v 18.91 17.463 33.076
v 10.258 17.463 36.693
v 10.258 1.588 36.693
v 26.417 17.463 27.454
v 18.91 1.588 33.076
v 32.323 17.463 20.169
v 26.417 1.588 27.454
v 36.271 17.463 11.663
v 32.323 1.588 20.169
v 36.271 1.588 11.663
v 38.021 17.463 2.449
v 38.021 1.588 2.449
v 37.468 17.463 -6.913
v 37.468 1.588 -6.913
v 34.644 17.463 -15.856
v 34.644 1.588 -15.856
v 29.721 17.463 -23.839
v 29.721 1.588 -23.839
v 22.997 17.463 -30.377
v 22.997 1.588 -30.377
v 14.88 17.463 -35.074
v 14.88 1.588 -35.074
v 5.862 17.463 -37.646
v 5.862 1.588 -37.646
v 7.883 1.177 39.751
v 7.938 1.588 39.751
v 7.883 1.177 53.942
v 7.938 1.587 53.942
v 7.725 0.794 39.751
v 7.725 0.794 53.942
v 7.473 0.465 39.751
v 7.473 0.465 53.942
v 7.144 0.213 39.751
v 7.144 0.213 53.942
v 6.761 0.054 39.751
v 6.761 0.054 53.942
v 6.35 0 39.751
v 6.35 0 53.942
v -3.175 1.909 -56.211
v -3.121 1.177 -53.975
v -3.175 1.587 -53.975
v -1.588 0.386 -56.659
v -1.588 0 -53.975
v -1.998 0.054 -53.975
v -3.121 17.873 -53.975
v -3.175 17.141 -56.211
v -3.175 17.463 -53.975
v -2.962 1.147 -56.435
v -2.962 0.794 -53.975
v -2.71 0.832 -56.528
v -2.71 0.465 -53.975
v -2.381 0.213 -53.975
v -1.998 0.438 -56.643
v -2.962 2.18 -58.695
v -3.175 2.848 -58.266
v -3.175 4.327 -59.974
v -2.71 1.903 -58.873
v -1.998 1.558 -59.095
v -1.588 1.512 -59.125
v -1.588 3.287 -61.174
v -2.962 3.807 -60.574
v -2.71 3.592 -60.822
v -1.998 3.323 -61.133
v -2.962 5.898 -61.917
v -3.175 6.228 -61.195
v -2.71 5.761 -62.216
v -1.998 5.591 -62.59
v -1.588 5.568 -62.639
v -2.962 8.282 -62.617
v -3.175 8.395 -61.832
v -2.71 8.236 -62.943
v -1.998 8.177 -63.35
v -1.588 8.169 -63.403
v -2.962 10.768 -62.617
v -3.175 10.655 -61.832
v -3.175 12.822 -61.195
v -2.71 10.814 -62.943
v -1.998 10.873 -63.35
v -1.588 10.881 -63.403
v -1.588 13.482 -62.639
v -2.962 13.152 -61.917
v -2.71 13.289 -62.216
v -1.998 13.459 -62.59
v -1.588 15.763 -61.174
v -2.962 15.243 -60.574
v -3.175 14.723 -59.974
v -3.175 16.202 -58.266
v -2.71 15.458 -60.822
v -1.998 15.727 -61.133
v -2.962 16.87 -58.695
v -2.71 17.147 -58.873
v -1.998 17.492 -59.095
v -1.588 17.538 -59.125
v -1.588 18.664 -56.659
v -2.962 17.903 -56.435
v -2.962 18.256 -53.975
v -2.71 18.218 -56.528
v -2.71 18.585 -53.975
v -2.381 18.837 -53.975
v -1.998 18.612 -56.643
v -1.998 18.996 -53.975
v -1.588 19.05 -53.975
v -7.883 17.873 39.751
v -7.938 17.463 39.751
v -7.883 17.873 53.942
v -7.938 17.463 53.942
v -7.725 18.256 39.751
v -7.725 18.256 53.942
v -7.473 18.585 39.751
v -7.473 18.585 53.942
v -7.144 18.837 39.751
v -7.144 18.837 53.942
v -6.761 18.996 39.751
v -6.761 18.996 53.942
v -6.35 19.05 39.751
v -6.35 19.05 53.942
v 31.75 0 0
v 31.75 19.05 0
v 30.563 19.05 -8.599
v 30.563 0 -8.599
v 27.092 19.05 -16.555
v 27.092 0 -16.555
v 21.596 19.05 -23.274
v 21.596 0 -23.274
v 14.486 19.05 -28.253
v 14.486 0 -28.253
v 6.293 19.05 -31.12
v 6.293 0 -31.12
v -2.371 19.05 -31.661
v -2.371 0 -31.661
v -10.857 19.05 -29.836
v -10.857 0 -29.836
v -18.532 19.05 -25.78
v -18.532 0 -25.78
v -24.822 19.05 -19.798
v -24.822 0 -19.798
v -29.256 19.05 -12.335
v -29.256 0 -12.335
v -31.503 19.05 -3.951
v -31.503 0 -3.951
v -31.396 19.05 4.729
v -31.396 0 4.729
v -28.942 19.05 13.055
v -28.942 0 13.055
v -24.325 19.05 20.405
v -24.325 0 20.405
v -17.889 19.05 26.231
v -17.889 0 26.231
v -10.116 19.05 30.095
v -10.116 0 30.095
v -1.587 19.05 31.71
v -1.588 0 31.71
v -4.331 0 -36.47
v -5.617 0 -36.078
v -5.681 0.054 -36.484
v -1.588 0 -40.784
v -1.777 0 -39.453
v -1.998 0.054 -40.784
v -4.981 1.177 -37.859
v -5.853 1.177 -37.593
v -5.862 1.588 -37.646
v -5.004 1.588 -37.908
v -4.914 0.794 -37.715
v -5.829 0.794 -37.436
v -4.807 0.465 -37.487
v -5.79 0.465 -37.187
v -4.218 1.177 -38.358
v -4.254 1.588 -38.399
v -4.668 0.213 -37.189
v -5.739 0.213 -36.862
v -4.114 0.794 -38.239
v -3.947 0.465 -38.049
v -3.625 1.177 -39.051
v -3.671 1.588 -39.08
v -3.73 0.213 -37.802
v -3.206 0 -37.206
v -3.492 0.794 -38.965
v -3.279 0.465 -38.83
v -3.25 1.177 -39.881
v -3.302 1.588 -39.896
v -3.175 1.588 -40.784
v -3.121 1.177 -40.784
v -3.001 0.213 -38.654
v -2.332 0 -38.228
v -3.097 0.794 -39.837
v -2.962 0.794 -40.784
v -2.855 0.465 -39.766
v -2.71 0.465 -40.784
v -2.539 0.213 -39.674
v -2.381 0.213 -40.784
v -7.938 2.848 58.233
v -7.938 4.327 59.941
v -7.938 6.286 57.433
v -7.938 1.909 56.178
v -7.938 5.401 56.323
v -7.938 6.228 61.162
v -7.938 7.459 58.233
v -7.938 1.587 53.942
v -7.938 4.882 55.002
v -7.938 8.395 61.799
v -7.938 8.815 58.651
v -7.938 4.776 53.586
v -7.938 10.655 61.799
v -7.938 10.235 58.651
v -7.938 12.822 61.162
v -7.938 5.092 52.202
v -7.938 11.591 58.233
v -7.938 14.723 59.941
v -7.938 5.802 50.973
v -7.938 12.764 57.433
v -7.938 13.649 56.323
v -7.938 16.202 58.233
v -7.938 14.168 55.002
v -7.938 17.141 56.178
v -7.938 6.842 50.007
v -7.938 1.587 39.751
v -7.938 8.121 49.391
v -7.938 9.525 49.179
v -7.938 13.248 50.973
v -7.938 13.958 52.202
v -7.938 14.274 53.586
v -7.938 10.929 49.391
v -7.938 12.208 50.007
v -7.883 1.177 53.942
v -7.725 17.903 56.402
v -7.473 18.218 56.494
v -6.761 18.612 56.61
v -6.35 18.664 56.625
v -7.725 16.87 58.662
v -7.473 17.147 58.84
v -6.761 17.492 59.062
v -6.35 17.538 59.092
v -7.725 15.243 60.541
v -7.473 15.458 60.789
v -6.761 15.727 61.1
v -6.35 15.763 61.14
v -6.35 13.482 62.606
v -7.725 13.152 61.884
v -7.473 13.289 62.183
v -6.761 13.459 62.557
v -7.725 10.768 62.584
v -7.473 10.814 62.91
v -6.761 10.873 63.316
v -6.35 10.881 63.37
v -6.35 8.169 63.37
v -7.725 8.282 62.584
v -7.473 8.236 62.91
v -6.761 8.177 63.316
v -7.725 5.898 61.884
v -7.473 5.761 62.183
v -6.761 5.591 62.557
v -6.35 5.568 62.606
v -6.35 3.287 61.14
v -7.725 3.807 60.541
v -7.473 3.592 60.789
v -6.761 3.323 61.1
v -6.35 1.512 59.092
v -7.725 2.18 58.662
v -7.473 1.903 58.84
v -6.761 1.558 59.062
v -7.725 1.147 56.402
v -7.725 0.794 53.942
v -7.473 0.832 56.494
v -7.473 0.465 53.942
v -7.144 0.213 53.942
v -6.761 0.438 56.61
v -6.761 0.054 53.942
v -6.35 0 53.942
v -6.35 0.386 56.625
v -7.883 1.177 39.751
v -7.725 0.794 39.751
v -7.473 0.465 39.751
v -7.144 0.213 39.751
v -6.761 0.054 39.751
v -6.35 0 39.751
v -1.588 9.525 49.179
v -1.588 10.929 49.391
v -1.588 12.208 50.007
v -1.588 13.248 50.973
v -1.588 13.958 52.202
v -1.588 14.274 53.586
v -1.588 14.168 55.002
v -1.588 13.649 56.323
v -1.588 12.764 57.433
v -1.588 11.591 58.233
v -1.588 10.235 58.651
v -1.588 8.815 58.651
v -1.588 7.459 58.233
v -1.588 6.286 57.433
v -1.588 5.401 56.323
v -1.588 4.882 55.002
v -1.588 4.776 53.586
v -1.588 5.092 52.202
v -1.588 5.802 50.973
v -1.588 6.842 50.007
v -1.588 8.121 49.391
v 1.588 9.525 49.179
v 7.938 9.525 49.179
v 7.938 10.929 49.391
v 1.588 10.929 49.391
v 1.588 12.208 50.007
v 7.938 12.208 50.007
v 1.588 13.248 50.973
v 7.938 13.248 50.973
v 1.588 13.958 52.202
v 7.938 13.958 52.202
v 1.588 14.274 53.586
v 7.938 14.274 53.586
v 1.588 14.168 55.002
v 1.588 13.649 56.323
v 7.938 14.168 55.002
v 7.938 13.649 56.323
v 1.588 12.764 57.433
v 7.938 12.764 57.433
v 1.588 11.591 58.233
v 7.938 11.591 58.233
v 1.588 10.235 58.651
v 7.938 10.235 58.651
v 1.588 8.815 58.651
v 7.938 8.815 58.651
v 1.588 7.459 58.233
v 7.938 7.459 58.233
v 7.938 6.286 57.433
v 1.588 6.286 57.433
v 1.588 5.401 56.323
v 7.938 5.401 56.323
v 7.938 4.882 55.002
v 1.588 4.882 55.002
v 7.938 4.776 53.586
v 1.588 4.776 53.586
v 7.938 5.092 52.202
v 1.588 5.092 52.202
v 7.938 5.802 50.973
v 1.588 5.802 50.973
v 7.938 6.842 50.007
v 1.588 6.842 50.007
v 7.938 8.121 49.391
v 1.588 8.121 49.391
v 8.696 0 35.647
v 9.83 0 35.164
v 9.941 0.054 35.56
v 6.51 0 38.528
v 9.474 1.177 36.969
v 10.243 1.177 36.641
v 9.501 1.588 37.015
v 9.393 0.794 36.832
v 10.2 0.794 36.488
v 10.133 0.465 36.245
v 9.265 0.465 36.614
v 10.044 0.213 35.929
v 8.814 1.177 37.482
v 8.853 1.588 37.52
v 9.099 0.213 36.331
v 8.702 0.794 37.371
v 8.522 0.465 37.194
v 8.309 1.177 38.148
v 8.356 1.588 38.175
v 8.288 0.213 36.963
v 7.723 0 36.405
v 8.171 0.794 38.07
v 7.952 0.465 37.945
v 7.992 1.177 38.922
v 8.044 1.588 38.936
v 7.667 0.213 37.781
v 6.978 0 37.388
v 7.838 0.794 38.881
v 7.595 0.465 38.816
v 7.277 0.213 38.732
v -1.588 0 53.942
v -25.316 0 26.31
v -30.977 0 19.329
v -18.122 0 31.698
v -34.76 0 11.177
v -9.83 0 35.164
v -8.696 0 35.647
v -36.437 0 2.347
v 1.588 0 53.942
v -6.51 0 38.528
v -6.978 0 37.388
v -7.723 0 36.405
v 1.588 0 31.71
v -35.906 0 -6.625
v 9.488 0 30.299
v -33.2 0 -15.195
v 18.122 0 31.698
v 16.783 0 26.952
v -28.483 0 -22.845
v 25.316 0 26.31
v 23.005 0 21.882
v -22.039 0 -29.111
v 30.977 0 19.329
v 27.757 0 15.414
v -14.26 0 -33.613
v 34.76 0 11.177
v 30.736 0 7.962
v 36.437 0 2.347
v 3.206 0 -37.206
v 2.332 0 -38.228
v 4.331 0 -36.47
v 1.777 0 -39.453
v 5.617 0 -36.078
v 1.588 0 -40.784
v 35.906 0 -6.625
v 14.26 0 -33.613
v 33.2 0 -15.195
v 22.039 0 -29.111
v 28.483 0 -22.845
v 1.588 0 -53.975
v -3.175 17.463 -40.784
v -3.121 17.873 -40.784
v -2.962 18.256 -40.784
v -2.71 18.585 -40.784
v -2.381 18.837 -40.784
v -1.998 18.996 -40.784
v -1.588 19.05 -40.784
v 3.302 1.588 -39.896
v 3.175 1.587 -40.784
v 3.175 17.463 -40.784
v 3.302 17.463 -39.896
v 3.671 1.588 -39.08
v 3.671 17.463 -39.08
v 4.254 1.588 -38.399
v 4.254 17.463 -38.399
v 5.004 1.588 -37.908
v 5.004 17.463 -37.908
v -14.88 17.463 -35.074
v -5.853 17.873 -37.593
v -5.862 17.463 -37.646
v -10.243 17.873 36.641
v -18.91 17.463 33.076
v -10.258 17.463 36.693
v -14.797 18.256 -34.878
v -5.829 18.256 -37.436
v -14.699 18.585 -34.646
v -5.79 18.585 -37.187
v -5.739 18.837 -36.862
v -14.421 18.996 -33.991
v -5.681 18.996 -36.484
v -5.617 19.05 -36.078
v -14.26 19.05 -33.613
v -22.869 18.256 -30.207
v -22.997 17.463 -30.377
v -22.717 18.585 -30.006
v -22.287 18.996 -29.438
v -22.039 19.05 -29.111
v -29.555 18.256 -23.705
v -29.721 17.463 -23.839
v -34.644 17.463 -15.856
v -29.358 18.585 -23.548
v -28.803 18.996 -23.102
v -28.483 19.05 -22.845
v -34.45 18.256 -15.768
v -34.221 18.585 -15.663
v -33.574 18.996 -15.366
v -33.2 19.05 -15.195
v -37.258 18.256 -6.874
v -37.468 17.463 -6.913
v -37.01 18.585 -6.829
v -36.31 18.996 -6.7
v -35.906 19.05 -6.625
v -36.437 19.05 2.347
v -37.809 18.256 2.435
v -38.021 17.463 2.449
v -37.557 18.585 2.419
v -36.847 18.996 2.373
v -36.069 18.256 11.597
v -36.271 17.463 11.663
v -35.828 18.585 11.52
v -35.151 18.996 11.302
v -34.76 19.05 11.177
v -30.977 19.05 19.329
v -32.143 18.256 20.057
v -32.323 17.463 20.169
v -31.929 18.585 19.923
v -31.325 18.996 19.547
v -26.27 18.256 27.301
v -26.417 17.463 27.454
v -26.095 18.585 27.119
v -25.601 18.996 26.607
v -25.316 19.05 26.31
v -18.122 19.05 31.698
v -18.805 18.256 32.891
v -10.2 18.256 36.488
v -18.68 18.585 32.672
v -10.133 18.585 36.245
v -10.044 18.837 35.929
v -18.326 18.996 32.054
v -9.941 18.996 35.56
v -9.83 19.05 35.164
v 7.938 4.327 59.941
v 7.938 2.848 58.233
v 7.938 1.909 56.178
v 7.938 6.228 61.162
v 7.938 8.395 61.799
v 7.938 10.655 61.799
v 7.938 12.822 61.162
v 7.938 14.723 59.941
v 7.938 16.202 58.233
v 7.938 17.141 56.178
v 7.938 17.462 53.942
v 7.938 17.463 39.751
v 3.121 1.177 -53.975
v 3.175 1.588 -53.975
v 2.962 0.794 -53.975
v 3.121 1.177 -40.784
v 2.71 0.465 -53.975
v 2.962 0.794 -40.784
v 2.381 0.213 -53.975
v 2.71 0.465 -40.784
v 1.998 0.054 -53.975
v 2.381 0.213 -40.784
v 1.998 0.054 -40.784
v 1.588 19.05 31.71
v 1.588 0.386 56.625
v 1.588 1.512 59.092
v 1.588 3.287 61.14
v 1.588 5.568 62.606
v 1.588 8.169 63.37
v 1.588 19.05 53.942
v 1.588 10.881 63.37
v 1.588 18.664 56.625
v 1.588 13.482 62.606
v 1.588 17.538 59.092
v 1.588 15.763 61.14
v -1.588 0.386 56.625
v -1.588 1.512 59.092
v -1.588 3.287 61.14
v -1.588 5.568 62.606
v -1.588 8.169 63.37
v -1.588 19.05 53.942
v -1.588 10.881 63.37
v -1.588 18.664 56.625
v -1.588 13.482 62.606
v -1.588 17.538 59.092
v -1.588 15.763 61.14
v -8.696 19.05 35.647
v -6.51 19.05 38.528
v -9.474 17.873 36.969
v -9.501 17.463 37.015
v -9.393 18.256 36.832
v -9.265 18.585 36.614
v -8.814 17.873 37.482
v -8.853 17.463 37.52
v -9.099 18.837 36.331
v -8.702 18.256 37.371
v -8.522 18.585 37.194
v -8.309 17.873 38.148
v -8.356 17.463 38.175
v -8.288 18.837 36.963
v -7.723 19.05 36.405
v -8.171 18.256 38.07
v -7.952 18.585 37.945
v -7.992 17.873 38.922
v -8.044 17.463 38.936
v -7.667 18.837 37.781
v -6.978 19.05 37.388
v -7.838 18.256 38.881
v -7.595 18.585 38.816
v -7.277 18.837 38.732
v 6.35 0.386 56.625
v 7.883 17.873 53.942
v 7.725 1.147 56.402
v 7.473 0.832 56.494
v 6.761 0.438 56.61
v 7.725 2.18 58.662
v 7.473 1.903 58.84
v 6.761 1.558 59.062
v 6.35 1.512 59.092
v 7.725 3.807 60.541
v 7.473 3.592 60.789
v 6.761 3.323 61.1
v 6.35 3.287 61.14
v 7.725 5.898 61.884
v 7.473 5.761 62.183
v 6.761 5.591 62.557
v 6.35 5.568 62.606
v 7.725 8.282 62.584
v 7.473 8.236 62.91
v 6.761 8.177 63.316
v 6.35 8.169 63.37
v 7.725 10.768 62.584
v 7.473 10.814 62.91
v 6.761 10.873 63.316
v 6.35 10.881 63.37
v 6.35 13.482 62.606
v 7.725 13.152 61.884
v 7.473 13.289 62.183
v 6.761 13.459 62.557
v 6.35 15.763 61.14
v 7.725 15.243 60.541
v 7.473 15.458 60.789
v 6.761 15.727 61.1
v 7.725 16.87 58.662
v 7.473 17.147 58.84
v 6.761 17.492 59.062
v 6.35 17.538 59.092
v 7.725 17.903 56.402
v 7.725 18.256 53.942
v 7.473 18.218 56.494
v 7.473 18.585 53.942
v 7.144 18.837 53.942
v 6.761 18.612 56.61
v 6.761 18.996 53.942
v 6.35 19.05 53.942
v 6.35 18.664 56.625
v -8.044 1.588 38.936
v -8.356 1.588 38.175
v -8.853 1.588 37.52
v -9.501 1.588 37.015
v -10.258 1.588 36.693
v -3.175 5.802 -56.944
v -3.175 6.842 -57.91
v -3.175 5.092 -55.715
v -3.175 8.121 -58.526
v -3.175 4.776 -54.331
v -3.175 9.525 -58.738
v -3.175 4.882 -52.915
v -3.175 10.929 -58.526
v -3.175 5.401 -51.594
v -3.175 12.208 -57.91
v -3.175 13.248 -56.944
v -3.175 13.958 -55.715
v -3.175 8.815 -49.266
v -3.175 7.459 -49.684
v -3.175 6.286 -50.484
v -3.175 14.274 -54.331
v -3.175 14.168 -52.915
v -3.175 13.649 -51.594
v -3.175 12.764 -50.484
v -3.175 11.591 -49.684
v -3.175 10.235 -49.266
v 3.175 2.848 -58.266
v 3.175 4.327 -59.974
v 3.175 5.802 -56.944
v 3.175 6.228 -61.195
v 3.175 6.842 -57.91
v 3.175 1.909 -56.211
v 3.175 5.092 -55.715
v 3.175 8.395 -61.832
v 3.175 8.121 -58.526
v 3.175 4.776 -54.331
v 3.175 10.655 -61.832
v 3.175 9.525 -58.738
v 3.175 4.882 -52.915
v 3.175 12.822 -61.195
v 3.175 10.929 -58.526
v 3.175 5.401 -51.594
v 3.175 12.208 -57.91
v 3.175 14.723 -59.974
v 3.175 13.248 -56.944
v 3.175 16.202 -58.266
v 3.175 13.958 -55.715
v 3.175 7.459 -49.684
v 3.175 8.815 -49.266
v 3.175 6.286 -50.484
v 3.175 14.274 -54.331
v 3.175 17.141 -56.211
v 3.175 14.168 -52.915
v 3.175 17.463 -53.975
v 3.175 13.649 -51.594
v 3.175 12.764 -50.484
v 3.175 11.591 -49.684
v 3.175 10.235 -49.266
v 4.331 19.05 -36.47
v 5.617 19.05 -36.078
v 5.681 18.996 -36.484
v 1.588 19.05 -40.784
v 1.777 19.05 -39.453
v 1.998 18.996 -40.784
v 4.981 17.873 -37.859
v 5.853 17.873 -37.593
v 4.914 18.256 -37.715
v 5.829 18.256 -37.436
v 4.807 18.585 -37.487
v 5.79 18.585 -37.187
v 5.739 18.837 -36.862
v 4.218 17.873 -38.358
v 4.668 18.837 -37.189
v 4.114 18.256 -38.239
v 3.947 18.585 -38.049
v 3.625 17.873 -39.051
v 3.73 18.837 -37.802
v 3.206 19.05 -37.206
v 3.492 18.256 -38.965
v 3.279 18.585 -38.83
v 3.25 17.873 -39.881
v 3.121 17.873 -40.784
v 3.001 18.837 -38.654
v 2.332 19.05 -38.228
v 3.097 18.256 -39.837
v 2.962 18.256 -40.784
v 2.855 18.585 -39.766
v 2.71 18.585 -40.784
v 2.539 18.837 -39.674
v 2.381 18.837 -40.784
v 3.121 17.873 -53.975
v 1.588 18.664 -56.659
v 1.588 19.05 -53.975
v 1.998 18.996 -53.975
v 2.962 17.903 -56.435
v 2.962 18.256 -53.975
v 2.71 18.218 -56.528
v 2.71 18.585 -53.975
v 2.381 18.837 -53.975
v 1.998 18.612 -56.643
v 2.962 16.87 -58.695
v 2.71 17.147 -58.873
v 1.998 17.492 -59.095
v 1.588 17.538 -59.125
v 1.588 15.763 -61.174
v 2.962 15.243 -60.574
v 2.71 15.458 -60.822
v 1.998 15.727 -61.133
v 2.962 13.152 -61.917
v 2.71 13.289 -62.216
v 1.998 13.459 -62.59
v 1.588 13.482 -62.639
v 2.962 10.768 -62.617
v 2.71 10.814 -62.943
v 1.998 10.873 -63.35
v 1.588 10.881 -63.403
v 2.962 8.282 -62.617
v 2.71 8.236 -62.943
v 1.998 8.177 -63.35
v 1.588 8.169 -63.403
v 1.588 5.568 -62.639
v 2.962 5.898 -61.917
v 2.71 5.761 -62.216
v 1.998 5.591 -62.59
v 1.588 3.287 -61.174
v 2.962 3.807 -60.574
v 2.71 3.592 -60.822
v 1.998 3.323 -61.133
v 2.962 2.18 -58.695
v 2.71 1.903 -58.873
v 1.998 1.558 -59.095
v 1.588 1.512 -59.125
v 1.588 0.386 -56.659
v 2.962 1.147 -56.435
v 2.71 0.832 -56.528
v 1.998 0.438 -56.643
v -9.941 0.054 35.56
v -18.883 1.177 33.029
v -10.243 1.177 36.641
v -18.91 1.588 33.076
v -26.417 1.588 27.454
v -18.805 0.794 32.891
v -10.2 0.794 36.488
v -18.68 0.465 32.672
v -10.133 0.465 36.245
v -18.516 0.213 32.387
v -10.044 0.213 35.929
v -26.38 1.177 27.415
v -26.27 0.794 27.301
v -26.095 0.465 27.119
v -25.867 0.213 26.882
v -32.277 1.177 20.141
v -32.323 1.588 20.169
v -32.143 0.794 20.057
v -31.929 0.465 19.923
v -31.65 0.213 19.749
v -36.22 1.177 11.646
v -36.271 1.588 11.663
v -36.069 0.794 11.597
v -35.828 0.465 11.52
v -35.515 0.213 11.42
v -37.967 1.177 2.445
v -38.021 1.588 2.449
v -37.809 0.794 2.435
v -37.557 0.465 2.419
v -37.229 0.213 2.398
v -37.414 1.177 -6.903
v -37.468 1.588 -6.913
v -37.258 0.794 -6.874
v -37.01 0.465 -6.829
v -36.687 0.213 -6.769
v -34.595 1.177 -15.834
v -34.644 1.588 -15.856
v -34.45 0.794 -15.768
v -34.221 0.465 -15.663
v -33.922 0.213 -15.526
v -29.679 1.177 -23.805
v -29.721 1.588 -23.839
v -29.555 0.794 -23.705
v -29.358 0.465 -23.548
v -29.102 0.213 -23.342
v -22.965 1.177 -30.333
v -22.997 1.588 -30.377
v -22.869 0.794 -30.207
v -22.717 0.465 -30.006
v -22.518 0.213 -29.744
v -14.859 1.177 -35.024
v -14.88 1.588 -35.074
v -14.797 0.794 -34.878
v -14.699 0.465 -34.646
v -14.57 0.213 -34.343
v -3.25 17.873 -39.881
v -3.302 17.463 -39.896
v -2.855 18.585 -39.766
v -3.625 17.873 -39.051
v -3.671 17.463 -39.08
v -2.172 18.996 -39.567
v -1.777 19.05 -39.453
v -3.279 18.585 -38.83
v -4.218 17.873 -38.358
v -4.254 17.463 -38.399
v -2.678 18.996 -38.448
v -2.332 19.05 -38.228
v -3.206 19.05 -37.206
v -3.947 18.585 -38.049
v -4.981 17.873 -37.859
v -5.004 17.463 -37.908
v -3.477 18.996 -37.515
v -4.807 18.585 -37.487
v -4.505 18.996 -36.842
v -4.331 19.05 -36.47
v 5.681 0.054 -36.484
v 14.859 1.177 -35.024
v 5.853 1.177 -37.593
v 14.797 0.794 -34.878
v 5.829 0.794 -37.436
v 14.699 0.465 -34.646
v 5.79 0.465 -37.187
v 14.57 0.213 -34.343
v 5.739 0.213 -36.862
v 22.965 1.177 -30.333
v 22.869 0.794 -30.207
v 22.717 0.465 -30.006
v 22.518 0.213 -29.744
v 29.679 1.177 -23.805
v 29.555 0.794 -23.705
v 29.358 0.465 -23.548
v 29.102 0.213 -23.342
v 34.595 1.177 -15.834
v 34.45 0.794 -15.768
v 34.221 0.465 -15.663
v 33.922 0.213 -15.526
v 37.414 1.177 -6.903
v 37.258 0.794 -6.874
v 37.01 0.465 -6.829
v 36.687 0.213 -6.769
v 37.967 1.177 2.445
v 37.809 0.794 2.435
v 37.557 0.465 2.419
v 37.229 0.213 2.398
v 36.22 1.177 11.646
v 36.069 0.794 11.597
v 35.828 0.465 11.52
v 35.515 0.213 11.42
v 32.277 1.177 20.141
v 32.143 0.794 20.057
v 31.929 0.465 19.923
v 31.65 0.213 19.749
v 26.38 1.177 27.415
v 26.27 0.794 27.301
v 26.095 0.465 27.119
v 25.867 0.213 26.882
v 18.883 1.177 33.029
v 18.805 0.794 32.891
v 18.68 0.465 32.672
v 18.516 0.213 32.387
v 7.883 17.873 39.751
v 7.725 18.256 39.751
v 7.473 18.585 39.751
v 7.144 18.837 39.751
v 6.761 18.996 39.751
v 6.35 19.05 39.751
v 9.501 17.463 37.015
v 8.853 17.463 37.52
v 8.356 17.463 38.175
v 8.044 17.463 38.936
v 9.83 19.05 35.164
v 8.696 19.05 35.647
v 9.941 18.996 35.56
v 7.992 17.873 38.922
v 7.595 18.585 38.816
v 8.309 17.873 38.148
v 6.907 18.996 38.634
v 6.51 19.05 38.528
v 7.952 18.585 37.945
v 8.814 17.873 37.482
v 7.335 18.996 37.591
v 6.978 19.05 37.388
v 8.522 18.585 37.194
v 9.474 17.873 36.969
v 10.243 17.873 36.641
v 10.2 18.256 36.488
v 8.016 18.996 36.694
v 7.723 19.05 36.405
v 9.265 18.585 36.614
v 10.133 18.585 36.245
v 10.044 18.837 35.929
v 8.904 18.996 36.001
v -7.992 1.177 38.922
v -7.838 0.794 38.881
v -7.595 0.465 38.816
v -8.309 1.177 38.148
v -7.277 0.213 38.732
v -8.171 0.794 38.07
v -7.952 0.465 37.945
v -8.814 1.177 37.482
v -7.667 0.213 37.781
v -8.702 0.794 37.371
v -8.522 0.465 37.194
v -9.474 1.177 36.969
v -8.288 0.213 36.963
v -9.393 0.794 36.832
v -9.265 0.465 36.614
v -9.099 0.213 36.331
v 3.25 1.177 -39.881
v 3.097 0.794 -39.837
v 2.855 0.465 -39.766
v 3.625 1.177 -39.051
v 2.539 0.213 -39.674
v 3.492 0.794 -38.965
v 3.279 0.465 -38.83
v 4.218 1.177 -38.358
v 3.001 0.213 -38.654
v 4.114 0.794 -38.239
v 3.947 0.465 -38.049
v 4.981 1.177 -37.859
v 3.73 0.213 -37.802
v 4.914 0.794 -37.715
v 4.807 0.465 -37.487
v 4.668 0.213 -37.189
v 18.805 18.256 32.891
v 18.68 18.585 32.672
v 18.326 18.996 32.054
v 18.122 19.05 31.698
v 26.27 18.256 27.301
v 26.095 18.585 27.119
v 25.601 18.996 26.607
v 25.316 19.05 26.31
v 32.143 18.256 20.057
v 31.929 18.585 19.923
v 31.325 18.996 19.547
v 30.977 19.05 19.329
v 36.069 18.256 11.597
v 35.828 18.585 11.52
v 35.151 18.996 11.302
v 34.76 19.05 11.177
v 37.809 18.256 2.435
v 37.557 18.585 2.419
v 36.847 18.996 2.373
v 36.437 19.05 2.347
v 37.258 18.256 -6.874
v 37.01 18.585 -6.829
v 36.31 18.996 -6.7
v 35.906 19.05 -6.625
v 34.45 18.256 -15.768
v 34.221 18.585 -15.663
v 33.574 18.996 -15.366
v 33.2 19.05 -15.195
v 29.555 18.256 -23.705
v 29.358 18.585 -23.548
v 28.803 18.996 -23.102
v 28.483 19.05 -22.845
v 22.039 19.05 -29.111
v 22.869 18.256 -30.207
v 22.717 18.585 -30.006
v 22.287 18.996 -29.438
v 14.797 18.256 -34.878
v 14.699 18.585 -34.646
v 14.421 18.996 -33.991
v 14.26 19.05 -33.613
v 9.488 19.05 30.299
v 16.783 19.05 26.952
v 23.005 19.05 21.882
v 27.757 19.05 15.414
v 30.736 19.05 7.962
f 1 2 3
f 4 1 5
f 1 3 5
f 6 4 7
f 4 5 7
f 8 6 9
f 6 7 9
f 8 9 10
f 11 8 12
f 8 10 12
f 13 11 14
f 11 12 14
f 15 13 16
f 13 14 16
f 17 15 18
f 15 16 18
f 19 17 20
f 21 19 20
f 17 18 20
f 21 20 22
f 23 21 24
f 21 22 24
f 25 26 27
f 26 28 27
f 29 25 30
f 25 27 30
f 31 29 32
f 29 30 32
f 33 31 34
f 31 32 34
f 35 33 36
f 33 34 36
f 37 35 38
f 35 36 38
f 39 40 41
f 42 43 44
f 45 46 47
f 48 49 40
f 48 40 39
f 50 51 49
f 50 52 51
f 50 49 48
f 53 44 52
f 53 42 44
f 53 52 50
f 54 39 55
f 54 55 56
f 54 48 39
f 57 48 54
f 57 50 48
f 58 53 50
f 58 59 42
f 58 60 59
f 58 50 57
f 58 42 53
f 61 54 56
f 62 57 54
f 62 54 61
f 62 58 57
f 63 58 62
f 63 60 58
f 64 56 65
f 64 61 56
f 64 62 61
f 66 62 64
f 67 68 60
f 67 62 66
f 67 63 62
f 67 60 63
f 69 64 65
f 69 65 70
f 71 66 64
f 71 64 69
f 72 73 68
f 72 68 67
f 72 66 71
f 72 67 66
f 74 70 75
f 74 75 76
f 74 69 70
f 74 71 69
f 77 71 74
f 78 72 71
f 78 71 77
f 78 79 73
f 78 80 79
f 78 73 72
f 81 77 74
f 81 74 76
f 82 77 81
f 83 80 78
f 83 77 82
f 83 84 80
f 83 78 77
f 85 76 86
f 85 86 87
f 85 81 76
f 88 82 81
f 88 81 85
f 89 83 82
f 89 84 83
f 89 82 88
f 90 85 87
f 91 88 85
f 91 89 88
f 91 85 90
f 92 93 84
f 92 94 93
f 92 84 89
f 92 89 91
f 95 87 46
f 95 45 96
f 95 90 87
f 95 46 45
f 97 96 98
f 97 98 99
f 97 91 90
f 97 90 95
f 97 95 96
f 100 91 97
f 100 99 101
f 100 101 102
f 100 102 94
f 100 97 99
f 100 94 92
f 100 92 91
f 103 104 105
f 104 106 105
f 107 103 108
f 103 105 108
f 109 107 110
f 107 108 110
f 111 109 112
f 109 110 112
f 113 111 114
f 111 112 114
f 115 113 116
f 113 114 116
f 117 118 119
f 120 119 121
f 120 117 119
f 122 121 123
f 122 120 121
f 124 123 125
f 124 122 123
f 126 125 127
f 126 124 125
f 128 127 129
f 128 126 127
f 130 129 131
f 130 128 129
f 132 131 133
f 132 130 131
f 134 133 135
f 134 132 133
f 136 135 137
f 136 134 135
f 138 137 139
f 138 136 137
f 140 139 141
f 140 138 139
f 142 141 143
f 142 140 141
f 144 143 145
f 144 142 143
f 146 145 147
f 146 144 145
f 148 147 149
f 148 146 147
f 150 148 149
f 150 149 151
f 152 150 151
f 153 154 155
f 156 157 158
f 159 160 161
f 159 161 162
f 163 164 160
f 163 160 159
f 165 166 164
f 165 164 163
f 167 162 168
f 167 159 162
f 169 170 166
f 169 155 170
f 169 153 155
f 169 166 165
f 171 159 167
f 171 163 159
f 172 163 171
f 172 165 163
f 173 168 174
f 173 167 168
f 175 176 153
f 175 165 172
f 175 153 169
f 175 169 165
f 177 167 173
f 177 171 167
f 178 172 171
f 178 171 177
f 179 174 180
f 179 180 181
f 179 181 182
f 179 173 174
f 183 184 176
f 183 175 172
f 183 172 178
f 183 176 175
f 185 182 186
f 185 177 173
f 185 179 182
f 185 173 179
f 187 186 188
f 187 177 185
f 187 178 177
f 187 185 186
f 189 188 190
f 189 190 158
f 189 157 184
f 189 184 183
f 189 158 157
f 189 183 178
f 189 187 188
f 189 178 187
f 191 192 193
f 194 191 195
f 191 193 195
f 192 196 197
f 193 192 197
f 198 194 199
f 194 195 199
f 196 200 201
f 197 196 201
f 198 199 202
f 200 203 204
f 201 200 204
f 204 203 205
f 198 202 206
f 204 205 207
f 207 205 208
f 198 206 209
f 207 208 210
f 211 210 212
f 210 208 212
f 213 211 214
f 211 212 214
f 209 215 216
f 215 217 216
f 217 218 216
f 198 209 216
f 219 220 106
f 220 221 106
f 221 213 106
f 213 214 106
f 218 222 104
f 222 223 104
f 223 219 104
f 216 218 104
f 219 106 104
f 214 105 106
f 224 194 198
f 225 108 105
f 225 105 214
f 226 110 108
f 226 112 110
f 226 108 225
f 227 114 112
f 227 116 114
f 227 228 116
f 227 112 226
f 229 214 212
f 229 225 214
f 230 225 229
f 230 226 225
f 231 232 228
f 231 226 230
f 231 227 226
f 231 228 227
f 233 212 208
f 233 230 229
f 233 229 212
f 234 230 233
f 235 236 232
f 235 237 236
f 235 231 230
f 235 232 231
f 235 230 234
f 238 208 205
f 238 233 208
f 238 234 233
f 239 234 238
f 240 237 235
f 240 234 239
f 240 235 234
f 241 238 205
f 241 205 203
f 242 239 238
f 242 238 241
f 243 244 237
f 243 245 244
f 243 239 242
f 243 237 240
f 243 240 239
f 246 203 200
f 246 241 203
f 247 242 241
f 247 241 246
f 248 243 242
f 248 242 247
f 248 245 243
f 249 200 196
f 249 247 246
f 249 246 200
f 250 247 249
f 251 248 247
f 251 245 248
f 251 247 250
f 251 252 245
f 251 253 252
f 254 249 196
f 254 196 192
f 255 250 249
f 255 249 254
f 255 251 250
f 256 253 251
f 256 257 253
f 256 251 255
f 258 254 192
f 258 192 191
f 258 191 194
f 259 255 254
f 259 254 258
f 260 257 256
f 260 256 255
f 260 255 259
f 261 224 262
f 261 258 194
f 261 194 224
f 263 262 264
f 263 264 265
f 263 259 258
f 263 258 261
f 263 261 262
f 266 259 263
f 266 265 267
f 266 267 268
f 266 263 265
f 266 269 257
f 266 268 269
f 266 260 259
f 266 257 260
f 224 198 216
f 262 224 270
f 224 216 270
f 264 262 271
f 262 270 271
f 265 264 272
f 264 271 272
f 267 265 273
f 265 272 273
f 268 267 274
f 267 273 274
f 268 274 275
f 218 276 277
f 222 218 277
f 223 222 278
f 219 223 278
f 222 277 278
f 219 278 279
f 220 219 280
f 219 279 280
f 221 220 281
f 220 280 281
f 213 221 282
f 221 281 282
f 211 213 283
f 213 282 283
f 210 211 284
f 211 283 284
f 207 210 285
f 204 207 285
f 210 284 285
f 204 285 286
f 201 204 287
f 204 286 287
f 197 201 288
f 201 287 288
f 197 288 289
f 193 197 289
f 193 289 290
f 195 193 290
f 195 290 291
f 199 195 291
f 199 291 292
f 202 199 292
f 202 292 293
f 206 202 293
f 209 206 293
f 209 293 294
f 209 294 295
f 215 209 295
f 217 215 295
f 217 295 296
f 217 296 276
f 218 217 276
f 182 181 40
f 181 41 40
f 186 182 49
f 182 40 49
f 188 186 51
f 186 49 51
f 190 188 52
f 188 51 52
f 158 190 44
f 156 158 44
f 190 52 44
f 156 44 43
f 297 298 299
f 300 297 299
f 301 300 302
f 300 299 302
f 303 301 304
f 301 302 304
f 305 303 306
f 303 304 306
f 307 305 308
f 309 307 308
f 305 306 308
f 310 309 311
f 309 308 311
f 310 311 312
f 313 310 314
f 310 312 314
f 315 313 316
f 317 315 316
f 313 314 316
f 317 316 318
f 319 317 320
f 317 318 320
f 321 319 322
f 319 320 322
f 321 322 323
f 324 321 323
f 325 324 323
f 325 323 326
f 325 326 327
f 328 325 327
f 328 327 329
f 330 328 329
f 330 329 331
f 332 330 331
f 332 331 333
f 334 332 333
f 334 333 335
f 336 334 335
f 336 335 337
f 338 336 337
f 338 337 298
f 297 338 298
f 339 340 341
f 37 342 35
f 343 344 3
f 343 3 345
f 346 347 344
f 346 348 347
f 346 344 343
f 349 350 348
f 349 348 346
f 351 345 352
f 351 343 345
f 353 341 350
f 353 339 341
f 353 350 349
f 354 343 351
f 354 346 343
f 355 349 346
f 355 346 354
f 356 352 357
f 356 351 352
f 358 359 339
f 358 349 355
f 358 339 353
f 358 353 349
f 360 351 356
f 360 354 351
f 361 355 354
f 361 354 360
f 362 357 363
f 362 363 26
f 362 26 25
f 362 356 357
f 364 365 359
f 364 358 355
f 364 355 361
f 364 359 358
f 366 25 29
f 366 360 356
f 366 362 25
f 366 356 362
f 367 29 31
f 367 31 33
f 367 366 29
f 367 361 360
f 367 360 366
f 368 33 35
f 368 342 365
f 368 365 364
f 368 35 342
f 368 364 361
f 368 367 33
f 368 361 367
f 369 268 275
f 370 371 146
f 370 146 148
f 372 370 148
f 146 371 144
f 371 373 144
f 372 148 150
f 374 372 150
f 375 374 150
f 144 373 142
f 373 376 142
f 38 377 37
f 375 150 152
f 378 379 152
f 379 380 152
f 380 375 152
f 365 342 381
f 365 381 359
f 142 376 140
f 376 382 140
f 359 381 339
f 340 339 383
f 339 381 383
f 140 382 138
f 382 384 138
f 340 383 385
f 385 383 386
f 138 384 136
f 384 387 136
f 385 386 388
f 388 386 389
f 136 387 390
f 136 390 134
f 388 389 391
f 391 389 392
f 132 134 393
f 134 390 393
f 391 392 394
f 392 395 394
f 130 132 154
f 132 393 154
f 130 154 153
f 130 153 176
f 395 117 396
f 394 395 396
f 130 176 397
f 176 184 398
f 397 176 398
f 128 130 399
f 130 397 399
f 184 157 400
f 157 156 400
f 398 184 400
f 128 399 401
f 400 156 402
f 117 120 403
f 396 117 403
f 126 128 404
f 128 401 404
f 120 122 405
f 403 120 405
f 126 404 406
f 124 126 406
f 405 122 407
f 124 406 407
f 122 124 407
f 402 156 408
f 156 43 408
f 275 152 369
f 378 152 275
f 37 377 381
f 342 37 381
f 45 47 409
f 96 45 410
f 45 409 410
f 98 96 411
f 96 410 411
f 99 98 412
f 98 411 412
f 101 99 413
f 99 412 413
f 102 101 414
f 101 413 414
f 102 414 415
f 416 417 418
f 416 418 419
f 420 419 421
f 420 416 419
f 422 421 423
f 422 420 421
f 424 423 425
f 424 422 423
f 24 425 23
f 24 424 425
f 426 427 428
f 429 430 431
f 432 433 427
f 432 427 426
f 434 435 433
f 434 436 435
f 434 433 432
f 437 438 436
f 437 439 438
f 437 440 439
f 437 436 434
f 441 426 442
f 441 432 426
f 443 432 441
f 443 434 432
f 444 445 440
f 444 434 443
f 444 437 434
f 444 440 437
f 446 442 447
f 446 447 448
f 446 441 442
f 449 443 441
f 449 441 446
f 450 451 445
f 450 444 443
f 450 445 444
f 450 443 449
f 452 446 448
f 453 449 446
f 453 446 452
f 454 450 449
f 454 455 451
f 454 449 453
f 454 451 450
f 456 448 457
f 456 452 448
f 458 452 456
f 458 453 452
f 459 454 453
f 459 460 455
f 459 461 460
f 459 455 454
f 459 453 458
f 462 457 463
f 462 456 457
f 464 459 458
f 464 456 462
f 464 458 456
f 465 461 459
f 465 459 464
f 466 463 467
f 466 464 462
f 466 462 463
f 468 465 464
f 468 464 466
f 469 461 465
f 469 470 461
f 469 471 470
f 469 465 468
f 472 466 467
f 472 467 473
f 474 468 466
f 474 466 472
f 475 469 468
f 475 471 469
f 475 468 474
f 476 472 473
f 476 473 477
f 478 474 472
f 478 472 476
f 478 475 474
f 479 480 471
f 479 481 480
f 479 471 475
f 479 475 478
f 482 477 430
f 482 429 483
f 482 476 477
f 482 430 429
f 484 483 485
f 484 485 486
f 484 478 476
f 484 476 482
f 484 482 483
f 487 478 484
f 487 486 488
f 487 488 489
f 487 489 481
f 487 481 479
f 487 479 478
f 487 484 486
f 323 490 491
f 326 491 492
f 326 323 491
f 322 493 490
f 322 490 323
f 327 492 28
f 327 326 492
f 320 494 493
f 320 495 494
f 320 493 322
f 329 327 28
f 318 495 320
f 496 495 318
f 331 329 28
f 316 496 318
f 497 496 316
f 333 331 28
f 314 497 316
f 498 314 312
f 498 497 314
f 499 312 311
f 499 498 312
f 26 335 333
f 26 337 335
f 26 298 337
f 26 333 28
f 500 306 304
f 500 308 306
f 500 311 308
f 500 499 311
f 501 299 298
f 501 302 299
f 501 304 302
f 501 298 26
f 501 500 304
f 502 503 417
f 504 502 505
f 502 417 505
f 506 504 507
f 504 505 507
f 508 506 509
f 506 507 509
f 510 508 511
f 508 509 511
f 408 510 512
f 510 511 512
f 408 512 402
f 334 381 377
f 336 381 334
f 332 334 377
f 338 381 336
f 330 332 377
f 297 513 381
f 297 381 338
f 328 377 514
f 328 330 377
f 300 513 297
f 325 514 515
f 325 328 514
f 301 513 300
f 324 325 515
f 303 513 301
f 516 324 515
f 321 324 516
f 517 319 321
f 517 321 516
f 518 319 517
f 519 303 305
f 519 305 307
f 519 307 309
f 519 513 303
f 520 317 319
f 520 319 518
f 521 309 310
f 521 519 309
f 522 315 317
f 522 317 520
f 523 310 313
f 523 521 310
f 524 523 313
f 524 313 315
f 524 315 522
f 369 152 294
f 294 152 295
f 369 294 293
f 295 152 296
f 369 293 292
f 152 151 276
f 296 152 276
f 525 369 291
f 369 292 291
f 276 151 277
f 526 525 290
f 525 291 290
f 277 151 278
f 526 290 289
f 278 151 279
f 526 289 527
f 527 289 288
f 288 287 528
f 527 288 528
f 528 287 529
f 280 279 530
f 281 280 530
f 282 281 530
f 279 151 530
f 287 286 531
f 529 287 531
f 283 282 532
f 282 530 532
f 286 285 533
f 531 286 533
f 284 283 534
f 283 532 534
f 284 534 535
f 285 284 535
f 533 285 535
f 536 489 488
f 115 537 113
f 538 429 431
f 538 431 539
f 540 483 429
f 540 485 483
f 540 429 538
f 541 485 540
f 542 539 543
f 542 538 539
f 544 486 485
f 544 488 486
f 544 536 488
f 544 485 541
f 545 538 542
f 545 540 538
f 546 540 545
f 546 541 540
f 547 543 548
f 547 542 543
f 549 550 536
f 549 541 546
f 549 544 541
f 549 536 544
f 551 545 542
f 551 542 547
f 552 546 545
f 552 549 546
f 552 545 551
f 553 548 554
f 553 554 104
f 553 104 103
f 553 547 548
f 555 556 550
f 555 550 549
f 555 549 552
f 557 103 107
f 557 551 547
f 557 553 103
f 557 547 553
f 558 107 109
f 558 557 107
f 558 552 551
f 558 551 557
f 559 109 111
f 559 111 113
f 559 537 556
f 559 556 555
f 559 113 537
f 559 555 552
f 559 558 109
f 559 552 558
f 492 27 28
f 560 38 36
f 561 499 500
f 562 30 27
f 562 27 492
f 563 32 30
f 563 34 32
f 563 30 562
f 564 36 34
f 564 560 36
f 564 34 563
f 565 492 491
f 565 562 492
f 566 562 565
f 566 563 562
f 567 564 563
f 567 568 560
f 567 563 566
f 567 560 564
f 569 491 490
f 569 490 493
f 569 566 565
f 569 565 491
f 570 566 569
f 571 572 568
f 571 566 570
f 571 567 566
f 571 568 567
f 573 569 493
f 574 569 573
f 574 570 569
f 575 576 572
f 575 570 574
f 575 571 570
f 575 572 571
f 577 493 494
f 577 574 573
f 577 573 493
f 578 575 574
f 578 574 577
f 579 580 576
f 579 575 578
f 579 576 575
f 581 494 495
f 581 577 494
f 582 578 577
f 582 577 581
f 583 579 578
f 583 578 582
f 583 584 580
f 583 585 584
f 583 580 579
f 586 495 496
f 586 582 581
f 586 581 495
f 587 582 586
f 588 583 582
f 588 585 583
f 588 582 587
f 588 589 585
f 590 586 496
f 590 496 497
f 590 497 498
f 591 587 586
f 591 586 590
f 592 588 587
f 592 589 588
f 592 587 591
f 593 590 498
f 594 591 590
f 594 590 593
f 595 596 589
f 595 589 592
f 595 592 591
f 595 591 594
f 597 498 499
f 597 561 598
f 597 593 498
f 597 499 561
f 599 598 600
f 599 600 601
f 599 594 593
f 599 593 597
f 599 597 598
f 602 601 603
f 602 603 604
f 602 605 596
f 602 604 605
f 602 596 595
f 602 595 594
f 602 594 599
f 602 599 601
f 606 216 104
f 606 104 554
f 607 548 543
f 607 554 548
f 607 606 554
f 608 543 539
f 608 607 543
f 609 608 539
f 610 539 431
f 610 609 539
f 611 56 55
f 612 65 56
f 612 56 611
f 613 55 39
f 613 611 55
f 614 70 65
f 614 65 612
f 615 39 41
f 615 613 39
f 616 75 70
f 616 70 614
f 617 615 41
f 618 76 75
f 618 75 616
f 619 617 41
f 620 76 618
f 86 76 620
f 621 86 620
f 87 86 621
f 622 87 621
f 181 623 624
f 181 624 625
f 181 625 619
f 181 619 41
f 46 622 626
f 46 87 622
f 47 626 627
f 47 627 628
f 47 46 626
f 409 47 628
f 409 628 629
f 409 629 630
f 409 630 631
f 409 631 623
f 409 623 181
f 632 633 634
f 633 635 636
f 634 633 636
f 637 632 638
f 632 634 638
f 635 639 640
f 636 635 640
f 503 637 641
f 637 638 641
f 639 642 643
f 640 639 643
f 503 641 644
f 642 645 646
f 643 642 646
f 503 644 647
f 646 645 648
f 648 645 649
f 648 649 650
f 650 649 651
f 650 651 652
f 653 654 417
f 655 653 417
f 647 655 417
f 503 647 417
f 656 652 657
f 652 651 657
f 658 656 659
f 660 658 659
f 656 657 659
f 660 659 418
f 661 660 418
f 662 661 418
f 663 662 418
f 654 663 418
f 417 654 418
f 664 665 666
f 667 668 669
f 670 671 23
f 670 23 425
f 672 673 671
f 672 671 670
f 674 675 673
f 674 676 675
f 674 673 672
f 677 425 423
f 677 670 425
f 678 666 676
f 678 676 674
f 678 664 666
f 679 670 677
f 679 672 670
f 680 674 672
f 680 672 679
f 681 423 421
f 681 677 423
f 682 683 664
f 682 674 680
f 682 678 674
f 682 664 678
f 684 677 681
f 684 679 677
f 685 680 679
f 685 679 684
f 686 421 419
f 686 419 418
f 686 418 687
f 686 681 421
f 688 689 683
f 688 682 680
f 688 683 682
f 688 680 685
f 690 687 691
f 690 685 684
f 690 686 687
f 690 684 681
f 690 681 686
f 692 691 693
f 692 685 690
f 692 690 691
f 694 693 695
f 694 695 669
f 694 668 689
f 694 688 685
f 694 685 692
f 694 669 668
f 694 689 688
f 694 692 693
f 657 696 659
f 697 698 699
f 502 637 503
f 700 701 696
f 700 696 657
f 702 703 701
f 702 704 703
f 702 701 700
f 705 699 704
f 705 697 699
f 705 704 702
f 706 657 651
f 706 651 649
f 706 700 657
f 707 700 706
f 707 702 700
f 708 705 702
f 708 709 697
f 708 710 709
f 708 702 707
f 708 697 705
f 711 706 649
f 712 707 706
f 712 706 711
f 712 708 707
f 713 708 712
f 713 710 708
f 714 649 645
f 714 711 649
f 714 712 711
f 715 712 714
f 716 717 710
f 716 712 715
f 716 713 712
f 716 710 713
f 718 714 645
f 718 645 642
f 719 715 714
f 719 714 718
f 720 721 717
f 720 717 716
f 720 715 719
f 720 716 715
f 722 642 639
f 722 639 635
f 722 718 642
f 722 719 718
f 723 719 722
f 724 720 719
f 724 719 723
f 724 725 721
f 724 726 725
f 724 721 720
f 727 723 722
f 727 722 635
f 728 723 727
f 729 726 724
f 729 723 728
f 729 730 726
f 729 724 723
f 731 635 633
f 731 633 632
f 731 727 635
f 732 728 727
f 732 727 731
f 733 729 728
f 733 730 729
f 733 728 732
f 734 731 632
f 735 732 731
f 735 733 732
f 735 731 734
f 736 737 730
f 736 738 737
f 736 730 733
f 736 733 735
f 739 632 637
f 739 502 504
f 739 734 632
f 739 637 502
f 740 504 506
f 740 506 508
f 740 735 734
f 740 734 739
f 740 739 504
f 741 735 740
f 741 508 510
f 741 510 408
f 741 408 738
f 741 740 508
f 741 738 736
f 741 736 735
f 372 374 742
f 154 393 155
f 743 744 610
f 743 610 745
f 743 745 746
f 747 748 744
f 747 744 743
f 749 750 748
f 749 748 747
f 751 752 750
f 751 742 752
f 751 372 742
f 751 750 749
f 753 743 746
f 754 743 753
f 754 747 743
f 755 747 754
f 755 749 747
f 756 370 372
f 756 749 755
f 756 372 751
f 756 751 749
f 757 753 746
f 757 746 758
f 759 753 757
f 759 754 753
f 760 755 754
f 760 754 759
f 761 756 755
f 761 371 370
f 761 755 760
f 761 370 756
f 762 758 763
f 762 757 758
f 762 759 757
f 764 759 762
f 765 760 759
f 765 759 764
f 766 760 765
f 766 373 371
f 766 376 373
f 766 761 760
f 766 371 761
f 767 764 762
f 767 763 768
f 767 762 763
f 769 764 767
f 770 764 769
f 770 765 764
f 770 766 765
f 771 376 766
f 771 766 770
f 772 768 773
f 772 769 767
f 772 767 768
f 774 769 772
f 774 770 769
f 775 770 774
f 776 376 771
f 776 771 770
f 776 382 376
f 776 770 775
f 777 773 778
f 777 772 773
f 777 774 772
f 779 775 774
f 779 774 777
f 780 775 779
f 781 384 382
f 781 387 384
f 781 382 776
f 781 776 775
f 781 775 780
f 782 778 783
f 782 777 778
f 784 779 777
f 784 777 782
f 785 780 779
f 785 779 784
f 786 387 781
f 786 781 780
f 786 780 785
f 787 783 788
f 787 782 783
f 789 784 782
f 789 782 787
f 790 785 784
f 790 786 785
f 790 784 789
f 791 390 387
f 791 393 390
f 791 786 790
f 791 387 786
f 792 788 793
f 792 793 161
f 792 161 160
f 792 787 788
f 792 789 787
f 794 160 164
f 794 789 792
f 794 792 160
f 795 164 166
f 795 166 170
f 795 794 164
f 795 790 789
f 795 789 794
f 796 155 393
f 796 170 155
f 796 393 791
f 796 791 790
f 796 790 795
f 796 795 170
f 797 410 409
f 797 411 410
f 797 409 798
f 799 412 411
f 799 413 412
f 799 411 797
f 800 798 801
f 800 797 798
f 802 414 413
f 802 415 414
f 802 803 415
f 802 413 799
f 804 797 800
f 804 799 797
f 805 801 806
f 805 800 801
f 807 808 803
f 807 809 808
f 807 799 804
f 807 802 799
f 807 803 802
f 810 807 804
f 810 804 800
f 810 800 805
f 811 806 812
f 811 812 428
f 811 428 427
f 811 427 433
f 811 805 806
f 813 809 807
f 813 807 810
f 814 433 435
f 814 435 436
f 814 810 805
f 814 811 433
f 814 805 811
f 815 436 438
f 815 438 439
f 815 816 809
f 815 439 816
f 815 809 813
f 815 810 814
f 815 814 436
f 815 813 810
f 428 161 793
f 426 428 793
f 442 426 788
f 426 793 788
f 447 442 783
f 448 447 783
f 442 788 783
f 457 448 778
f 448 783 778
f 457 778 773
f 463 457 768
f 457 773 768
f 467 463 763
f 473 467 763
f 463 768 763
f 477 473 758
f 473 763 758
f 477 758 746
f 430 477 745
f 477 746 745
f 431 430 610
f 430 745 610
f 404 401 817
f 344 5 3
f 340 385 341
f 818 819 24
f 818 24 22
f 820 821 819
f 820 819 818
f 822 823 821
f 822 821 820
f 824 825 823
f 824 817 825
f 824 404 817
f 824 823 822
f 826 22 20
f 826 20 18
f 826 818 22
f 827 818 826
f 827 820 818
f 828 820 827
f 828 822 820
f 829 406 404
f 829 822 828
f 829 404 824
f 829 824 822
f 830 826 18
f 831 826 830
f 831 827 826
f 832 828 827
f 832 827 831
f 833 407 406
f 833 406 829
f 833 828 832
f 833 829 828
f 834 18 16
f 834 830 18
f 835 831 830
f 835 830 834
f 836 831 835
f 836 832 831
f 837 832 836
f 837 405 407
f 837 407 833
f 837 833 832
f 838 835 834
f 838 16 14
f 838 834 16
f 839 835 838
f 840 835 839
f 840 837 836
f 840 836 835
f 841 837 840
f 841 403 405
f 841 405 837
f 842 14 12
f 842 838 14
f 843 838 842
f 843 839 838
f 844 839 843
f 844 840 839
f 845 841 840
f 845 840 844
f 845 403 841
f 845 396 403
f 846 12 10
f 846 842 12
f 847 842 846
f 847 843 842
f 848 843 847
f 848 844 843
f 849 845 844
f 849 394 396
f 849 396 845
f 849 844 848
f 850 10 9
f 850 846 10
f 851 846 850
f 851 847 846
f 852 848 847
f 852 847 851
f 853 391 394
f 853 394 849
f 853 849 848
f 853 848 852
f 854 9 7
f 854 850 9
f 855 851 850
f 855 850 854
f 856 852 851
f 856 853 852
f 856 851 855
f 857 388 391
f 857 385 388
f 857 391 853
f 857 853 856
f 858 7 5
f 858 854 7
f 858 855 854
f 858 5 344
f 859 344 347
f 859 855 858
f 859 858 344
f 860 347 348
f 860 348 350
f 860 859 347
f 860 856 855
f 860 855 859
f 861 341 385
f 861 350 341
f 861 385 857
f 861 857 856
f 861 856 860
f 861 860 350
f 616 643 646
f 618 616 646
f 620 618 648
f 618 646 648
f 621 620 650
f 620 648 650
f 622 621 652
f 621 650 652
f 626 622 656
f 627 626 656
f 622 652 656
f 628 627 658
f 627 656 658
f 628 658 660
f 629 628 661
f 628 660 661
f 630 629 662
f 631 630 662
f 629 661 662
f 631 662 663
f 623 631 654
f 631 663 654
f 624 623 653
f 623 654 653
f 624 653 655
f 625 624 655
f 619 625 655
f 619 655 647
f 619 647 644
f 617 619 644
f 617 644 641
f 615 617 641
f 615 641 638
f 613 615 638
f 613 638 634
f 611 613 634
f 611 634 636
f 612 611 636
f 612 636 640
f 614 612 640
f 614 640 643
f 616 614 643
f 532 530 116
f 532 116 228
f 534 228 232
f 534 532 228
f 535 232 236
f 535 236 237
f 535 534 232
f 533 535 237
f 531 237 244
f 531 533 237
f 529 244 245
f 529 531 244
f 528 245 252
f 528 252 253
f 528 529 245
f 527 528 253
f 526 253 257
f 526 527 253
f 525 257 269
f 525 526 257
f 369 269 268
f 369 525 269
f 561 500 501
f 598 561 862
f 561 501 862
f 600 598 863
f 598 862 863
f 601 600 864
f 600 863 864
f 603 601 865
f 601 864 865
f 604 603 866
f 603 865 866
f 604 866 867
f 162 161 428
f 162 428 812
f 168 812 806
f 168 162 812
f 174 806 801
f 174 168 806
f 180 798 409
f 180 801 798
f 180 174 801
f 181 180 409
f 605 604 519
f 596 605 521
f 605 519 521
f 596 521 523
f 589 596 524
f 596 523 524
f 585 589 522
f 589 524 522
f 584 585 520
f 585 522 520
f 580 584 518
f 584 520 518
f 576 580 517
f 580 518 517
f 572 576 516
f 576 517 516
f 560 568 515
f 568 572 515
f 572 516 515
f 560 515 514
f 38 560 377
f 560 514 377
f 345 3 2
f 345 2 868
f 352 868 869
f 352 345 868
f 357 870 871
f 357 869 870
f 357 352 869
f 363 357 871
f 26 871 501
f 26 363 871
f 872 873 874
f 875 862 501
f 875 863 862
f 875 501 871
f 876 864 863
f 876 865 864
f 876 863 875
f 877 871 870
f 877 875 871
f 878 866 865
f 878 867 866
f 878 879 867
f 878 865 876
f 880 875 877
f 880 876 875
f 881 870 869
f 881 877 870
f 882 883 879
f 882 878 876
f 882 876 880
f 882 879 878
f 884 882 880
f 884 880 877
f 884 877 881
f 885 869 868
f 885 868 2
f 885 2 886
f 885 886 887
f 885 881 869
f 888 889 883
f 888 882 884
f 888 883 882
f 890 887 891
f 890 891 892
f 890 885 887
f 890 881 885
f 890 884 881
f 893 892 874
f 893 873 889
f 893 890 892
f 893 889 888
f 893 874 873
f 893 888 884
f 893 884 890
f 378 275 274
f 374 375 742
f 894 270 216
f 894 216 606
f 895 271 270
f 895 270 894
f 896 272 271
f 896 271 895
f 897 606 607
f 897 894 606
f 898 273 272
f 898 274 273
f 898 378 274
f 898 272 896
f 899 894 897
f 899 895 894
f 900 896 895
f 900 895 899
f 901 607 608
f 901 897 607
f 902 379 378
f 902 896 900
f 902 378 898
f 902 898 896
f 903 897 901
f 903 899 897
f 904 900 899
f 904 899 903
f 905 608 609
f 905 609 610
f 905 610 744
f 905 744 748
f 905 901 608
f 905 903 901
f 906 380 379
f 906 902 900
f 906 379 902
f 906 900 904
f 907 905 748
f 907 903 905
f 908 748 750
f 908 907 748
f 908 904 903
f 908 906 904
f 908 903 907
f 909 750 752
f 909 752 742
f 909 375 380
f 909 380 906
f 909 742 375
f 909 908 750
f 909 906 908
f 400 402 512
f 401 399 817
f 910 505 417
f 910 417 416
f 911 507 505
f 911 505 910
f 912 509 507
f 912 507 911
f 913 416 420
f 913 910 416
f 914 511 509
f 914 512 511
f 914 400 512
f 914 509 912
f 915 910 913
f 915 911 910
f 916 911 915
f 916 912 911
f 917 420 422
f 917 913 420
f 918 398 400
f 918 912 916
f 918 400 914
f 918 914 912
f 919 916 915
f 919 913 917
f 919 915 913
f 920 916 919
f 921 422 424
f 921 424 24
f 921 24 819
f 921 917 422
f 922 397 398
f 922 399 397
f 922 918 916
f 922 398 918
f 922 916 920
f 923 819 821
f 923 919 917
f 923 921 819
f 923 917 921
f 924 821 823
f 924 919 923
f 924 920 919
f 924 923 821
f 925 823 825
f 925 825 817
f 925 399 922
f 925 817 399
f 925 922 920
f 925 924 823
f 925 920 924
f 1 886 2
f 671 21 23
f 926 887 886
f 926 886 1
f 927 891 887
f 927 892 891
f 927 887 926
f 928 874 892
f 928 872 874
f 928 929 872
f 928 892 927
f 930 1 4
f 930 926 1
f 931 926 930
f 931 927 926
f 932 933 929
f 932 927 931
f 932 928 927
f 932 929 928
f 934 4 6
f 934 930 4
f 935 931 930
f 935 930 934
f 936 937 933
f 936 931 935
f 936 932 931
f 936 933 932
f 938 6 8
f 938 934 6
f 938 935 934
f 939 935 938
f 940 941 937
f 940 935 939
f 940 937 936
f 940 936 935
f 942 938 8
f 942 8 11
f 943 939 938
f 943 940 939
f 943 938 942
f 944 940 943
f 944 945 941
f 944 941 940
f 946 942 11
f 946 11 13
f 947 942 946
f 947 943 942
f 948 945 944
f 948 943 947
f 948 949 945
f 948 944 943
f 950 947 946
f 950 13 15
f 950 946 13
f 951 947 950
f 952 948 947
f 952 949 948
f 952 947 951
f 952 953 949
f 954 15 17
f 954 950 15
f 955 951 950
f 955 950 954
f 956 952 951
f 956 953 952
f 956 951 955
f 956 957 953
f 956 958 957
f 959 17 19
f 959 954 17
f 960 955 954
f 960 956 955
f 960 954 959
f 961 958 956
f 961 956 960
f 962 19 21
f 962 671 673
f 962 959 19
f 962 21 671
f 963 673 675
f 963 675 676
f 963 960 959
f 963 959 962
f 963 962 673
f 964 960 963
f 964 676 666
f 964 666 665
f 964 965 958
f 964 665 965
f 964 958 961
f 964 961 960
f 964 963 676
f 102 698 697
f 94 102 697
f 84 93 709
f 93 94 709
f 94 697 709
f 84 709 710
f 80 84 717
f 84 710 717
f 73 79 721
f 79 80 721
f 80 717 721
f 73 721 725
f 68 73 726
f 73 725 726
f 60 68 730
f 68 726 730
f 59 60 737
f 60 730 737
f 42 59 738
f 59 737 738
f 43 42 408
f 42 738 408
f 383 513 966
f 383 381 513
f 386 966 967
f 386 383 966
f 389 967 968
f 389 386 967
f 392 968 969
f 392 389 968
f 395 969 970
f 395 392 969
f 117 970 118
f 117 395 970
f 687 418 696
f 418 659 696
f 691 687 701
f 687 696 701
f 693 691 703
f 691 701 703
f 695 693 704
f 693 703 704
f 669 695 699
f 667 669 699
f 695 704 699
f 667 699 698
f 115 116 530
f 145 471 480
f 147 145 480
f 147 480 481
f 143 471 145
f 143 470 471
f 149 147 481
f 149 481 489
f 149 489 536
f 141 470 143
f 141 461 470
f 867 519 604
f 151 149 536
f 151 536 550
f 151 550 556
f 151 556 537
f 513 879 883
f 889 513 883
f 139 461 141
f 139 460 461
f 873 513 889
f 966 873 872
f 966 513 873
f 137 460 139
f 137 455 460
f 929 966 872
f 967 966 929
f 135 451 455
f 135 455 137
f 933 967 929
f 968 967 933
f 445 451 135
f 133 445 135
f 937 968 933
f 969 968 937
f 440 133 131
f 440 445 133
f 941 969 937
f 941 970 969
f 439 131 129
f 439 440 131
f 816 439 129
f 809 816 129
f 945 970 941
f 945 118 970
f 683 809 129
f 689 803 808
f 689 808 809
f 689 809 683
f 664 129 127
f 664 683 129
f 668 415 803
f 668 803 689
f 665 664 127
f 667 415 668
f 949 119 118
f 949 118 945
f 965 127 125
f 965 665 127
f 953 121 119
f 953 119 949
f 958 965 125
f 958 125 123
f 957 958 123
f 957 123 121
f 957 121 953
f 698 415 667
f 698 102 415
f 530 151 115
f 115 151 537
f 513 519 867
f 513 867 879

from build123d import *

# Parameters (mm, degrees)
SKETCH1_R          = 38.1
SKETCH1_R_2        = 31.75
EXTRUDE1_DEPTH     = 19.05
SKETCH2_W          = 3.175
SKETCH2_H          = 40.64
CUT_EXTRUDE1_DEPTH = 20.05
EXTRUDE2_DEPTH     = 6.35
SKETCH6_R          = 4.7625
CUT_EXTRUDE3_DEPTH = 47.0375
EXTRUDE4_DEPTH     = 3.175
FILLET4_R          = 3.175
SKETCH10_R         = 4.7625
CUT_EXTRUDE6_DEPTH = 42.275
FILLET5_R          = 1.5875


with BuildPart() as part:
    # Sketch1 → Extrude1 (new body)
    with BuildSketch(Plane(origin=(0, 0, 0), x_dir=(1, 0, 0), z_dir=(0, 1, 0))):
        Circle(SKETCH1_R)
        Circle(SKETCH1_R_2, mode=Mode.SUBTRACT)
    extrude(amount=EXTRUDE1_DEPTH)

    # Sketch2 → Cut-Extrude1 (cut, through all)
    with BuildSketch(Plane(origin=(0, 19.05, 0), x_dir=(-1, 0, 0), z_dir=(0, 1, 0))):
        with Locations((0, 20.32)):
            Rectangle(SKETCH2_W, SKETCH2_H)
    extrude(amount=-CUT_EXTRUDE1_DEPTH, mode=Mode.SUBTRACT)

    # Sketch3 → Extrude2 (add)
    with BuildSketch(Plane.ZY.offset(-1.5875)):
        with BuildLine():
            Line((31.710287664, 19.05), (53.941912716, 19.05))
            ThreePointArc((53.941912716, 19.05), (63.466912716, 9.525), (53.941912716, 0))
            Line((53.941912716, 0), (31.710287664, 0))
            Line((31.710287664, 0), (31.710287664, 19.05))
        make_face()
    extrude2 = extrude(amount=-EXTRUDE2_DEPTH)

    # Mirror1: Extrude2 across plane
    add(extrude2.mirror(Plane(origin=(0, 0, 0), x_dir=(0, 0, 1), z_dir=(1, 0, 0))))

    # Sketch6 → Cut-Extrude3 (cut, through all)
    with BuildSketch(Plane(origin=(7.9375, 0, 0), x_dir=(0, 0, -1), z_dir=(1, 0, 0))):
        with Locations((-53.941912716, 9.525)):
            Circle(SKETCH6_R)
    extrude(amount=-CUT_EXTRUDE3_DEPTH, mode=Mode.SUBTRACT)

    # Sketch7 → Extrude4 (add, symmetric)
    with BuildSketch(Plane(origin=(0, 0, 0), x_dir=(0, 0, -1), z_dir=(1, 0, 0))):
        with BuildLine():
            Line((31.75, 19.05), (53.975, 19.05))
            ThreePointArc((53.975, 19.05), (63.5, 9.525), (53.975, 0))
            Line((53.975, 0), (31.75, 0))
            Line((31.75, 0), (31.75, 19.05))
        make_face()
    extrude(amount=EXTRUDE4_DEPTH, both=True)

    # Fillet4
    fillet4_edges = [part.edges().sort_by_distance(p)[0] for p in [
        (7.9375, 9.525, 37.264005337),
        (-7.9375, 9.525, 37.264005337),
        (-3.175, 9.525, -37.967477859),
        (3.175, 9.525, -37.967477859),
    ]]
    fillet(fillet4_edges, radius=FILLET4_R)

    # Sketch10 → Cut-Extrude6 (cut, through all)
    with BuildSketch(Plane(origin=(3.175, 0, 0), x_dir=(0, 0, -1), z_dir=(1, 0, 0))):
        with Locations((53.975, 9.525)):
            Circle(SKETCH10_R)
    extrude(amount=-CUT_EXTRUDE6_DEPTH, mode=Mode.SUBTRACT)

    # Fillet5
    fillet5_edges = [part.edges().sort_by_distance(p)[0] for p in [
        (-38.033554879, 19.05, -2.249156126),
        (-38.033554879, 0, -2.249156126),
        (-7.9375, 0, 46.846430999),
        (38.033554879, 19.05, -2.249156126),
        (38.033554879, 0, -2.249156126),
        (7.9375, 0, 46.846430999),
        (3.175, 0, -47.379306719),
        (-3.175, 0, -47.379306719),
        (-8.583207666, 19.05, 37.831755365),
        (-8.583207666, 0, 37.831755365),
        (8.583207666, 0, 37.831755365),
        (8.583207666, 19.05, 37.831755365),
        (3.938414382, 0, -38.718454894),
        (3.938414382, 19.05, -38.718454894),
        (-3.938414382, 0, -38.718454894),
        (-3.938414382, 19.05, -38.718454894),
        (7.9375, 19.05, 46.846430999),
        (7.9375, 9.525, 63.466912716),
        (-7.9375, 9.525, 63.466912716),
        (-7.9375, 19.05, 46.846430999),
        (3.175, 19.05, -47.379306719),
        (3.175, 9.525, -63.5),
        (-3.175, 19.05, -47.379306719),
        (-3.175, 9.525, -63.5),
    ]]
    fillet(fillet5_edges, radius=FILLET5_R)


solid = part.part
